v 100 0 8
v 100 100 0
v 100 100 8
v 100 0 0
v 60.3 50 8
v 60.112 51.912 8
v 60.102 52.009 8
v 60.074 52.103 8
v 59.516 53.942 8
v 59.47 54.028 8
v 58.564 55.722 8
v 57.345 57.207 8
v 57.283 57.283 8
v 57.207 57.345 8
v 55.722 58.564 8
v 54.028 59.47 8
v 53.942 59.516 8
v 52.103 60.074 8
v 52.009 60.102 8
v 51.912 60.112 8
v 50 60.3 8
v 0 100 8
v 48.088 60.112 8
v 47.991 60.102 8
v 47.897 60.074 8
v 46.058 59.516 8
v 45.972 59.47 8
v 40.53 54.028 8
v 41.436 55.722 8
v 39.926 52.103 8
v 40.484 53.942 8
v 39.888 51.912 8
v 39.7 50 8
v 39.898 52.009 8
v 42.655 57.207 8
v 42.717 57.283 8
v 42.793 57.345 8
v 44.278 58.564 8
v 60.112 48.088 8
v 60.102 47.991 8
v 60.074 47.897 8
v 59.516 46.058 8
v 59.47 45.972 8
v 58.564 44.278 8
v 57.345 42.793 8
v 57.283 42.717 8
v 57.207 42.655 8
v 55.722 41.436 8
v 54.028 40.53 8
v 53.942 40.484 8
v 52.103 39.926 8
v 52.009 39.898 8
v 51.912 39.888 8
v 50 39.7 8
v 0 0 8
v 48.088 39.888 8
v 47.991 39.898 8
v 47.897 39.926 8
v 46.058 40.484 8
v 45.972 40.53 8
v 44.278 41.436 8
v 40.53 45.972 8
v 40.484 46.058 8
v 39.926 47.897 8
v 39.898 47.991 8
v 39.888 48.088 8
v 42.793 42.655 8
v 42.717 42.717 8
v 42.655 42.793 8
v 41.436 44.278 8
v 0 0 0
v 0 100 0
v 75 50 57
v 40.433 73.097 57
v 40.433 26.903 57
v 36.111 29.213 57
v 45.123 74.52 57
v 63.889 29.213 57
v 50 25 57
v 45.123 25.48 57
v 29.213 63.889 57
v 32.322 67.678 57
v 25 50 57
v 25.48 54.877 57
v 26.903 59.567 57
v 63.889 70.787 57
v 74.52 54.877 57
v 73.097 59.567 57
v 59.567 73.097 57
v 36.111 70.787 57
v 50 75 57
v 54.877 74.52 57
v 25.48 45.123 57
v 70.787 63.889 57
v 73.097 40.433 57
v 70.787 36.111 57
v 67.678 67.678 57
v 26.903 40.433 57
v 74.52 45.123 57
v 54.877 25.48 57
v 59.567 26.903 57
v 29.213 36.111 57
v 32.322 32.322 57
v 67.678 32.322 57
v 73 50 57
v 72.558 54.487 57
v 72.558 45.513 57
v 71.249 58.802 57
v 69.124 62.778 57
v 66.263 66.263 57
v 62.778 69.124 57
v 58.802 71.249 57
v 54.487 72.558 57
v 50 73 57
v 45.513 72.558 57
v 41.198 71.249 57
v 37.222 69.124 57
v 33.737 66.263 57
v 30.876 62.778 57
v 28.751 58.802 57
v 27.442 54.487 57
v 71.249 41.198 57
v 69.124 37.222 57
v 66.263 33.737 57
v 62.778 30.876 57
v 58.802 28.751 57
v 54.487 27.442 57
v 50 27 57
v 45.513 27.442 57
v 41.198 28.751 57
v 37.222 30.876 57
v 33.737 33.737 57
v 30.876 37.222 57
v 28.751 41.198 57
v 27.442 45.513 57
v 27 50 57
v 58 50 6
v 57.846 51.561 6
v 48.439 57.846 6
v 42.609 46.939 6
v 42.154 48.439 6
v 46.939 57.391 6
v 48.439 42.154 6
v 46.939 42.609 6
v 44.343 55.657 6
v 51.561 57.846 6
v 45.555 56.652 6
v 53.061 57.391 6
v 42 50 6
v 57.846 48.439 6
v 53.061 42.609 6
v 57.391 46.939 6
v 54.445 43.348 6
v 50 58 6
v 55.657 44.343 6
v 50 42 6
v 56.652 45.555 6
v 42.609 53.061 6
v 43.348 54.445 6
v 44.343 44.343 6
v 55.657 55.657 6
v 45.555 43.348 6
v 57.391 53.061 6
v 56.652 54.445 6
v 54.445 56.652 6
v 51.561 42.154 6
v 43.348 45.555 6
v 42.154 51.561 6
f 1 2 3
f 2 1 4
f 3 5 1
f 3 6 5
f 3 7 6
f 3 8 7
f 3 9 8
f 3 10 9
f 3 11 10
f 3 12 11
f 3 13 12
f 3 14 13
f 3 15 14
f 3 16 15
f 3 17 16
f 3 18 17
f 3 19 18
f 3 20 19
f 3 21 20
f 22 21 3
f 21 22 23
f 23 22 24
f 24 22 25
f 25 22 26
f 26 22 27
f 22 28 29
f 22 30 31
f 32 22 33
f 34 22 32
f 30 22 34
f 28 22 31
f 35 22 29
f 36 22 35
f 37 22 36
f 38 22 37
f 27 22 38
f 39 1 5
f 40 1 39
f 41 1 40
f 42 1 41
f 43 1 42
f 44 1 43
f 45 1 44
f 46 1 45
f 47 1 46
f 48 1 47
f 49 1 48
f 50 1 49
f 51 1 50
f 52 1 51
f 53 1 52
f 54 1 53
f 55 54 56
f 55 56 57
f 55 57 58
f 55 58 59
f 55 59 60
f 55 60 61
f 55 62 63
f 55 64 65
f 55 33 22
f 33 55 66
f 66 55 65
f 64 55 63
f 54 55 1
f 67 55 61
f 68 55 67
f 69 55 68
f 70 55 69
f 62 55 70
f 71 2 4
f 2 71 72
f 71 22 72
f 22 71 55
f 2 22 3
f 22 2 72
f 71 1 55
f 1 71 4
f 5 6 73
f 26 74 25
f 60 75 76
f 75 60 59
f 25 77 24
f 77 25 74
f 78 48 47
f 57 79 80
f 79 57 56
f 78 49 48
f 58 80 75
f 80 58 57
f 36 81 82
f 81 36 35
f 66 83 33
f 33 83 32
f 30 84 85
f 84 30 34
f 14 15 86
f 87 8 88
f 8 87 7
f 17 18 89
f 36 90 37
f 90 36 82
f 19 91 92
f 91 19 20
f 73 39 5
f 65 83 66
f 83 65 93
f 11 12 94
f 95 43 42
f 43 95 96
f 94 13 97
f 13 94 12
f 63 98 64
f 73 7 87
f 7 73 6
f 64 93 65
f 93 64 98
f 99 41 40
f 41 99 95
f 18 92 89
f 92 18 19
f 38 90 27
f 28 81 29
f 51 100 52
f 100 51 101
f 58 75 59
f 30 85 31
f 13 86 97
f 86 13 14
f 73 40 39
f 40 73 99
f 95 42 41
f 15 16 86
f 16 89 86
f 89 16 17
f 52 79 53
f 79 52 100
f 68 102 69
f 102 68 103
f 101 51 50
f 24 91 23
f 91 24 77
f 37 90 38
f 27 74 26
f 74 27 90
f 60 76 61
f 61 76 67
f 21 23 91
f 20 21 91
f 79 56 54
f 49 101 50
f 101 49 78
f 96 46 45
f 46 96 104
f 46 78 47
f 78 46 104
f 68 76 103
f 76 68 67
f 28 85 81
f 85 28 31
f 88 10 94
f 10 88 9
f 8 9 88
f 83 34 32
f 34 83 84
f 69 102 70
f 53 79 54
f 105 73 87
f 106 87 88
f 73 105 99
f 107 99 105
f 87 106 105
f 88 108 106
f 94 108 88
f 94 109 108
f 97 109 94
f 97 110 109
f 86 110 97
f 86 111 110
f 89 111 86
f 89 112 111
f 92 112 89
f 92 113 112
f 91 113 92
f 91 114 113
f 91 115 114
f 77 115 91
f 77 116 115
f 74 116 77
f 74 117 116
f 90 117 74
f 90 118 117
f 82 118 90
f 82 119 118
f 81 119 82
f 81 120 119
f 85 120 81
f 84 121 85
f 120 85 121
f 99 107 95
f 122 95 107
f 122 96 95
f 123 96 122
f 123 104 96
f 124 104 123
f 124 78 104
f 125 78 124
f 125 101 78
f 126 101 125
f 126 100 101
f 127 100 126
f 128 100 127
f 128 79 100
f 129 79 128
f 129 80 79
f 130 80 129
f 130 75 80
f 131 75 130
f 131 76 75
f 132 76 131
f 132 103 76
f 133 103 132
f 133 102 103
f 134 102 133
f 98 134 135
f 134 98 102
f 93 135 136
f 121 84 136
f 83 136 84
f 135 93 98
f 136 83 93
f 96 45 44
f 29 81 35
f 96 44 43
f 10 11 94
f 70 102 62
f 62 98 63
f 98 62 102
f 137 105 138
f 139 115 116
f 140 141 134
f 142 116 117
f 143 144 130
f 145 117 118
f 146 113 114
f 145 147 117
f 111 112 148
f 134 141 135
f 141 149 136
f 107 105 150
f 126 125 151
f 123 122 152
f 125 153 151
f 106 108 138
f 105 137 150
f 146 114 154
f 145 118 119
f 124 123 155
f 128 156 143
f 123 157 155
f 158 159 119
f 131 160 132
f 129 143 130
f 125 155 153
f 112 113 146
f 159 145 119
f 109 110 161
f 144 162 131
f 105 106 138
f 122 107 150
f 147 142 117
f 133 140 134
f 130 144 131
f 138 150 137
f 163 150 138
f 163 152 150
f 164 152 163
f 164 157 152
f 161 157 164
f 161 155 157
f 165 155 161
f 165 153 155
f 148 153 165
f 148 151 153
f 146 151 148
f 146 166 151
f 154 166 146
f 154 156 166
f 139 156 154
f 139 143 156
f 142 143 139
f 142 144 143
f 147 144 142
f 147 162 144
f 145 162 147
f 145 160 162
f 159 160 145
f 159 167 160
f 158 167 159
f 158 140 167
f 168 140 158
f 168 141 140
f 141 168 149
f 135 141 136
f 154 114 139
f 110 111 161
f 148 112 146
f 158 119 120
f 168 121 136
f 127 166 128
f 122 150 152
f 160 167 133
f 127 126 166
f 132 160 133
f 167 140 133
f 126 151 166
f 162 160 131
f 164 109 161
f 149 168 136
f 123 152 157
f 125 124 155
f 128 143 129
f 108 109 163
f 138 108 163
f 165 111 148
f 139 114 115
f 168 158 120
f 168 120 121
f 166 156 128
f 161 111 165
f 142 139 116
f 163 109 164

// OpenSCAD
$fn = 32;

// ----------------------------------------------------------------------
// Hopper: funnel with square flange
// ----------------------------------------------------------------------

// --- parameters (mm) ---
fl = 100;                 // flange side, X and Y
fl_t = 8;                 // flange thickness
cone_h = 50;              // cone height above the flange
top_d = 50;               // cone mouth diameter
bot_d = 20;               // cone spout diameter
wall = 2;                 // cone wall thickness

bore_d = bot_d - 2 * wall;  // spout bore diameter
total_h = fl_t + cone_h - 1;  // overall height

difference() {
  union() {
    cube([fl, fl, fl_t]);
    translate([fl / 2, fl / 2, fl_t - 1])
      cylinder(h = cone_h, d1 = bot_d, d2 = top_d);
  }
  translate([fl / 2, fl / 2, fl_t - 2])
    cylinder(h = cone_h + 1, d1 = bore_d, d2 = top_d - 2 * wall);
}
